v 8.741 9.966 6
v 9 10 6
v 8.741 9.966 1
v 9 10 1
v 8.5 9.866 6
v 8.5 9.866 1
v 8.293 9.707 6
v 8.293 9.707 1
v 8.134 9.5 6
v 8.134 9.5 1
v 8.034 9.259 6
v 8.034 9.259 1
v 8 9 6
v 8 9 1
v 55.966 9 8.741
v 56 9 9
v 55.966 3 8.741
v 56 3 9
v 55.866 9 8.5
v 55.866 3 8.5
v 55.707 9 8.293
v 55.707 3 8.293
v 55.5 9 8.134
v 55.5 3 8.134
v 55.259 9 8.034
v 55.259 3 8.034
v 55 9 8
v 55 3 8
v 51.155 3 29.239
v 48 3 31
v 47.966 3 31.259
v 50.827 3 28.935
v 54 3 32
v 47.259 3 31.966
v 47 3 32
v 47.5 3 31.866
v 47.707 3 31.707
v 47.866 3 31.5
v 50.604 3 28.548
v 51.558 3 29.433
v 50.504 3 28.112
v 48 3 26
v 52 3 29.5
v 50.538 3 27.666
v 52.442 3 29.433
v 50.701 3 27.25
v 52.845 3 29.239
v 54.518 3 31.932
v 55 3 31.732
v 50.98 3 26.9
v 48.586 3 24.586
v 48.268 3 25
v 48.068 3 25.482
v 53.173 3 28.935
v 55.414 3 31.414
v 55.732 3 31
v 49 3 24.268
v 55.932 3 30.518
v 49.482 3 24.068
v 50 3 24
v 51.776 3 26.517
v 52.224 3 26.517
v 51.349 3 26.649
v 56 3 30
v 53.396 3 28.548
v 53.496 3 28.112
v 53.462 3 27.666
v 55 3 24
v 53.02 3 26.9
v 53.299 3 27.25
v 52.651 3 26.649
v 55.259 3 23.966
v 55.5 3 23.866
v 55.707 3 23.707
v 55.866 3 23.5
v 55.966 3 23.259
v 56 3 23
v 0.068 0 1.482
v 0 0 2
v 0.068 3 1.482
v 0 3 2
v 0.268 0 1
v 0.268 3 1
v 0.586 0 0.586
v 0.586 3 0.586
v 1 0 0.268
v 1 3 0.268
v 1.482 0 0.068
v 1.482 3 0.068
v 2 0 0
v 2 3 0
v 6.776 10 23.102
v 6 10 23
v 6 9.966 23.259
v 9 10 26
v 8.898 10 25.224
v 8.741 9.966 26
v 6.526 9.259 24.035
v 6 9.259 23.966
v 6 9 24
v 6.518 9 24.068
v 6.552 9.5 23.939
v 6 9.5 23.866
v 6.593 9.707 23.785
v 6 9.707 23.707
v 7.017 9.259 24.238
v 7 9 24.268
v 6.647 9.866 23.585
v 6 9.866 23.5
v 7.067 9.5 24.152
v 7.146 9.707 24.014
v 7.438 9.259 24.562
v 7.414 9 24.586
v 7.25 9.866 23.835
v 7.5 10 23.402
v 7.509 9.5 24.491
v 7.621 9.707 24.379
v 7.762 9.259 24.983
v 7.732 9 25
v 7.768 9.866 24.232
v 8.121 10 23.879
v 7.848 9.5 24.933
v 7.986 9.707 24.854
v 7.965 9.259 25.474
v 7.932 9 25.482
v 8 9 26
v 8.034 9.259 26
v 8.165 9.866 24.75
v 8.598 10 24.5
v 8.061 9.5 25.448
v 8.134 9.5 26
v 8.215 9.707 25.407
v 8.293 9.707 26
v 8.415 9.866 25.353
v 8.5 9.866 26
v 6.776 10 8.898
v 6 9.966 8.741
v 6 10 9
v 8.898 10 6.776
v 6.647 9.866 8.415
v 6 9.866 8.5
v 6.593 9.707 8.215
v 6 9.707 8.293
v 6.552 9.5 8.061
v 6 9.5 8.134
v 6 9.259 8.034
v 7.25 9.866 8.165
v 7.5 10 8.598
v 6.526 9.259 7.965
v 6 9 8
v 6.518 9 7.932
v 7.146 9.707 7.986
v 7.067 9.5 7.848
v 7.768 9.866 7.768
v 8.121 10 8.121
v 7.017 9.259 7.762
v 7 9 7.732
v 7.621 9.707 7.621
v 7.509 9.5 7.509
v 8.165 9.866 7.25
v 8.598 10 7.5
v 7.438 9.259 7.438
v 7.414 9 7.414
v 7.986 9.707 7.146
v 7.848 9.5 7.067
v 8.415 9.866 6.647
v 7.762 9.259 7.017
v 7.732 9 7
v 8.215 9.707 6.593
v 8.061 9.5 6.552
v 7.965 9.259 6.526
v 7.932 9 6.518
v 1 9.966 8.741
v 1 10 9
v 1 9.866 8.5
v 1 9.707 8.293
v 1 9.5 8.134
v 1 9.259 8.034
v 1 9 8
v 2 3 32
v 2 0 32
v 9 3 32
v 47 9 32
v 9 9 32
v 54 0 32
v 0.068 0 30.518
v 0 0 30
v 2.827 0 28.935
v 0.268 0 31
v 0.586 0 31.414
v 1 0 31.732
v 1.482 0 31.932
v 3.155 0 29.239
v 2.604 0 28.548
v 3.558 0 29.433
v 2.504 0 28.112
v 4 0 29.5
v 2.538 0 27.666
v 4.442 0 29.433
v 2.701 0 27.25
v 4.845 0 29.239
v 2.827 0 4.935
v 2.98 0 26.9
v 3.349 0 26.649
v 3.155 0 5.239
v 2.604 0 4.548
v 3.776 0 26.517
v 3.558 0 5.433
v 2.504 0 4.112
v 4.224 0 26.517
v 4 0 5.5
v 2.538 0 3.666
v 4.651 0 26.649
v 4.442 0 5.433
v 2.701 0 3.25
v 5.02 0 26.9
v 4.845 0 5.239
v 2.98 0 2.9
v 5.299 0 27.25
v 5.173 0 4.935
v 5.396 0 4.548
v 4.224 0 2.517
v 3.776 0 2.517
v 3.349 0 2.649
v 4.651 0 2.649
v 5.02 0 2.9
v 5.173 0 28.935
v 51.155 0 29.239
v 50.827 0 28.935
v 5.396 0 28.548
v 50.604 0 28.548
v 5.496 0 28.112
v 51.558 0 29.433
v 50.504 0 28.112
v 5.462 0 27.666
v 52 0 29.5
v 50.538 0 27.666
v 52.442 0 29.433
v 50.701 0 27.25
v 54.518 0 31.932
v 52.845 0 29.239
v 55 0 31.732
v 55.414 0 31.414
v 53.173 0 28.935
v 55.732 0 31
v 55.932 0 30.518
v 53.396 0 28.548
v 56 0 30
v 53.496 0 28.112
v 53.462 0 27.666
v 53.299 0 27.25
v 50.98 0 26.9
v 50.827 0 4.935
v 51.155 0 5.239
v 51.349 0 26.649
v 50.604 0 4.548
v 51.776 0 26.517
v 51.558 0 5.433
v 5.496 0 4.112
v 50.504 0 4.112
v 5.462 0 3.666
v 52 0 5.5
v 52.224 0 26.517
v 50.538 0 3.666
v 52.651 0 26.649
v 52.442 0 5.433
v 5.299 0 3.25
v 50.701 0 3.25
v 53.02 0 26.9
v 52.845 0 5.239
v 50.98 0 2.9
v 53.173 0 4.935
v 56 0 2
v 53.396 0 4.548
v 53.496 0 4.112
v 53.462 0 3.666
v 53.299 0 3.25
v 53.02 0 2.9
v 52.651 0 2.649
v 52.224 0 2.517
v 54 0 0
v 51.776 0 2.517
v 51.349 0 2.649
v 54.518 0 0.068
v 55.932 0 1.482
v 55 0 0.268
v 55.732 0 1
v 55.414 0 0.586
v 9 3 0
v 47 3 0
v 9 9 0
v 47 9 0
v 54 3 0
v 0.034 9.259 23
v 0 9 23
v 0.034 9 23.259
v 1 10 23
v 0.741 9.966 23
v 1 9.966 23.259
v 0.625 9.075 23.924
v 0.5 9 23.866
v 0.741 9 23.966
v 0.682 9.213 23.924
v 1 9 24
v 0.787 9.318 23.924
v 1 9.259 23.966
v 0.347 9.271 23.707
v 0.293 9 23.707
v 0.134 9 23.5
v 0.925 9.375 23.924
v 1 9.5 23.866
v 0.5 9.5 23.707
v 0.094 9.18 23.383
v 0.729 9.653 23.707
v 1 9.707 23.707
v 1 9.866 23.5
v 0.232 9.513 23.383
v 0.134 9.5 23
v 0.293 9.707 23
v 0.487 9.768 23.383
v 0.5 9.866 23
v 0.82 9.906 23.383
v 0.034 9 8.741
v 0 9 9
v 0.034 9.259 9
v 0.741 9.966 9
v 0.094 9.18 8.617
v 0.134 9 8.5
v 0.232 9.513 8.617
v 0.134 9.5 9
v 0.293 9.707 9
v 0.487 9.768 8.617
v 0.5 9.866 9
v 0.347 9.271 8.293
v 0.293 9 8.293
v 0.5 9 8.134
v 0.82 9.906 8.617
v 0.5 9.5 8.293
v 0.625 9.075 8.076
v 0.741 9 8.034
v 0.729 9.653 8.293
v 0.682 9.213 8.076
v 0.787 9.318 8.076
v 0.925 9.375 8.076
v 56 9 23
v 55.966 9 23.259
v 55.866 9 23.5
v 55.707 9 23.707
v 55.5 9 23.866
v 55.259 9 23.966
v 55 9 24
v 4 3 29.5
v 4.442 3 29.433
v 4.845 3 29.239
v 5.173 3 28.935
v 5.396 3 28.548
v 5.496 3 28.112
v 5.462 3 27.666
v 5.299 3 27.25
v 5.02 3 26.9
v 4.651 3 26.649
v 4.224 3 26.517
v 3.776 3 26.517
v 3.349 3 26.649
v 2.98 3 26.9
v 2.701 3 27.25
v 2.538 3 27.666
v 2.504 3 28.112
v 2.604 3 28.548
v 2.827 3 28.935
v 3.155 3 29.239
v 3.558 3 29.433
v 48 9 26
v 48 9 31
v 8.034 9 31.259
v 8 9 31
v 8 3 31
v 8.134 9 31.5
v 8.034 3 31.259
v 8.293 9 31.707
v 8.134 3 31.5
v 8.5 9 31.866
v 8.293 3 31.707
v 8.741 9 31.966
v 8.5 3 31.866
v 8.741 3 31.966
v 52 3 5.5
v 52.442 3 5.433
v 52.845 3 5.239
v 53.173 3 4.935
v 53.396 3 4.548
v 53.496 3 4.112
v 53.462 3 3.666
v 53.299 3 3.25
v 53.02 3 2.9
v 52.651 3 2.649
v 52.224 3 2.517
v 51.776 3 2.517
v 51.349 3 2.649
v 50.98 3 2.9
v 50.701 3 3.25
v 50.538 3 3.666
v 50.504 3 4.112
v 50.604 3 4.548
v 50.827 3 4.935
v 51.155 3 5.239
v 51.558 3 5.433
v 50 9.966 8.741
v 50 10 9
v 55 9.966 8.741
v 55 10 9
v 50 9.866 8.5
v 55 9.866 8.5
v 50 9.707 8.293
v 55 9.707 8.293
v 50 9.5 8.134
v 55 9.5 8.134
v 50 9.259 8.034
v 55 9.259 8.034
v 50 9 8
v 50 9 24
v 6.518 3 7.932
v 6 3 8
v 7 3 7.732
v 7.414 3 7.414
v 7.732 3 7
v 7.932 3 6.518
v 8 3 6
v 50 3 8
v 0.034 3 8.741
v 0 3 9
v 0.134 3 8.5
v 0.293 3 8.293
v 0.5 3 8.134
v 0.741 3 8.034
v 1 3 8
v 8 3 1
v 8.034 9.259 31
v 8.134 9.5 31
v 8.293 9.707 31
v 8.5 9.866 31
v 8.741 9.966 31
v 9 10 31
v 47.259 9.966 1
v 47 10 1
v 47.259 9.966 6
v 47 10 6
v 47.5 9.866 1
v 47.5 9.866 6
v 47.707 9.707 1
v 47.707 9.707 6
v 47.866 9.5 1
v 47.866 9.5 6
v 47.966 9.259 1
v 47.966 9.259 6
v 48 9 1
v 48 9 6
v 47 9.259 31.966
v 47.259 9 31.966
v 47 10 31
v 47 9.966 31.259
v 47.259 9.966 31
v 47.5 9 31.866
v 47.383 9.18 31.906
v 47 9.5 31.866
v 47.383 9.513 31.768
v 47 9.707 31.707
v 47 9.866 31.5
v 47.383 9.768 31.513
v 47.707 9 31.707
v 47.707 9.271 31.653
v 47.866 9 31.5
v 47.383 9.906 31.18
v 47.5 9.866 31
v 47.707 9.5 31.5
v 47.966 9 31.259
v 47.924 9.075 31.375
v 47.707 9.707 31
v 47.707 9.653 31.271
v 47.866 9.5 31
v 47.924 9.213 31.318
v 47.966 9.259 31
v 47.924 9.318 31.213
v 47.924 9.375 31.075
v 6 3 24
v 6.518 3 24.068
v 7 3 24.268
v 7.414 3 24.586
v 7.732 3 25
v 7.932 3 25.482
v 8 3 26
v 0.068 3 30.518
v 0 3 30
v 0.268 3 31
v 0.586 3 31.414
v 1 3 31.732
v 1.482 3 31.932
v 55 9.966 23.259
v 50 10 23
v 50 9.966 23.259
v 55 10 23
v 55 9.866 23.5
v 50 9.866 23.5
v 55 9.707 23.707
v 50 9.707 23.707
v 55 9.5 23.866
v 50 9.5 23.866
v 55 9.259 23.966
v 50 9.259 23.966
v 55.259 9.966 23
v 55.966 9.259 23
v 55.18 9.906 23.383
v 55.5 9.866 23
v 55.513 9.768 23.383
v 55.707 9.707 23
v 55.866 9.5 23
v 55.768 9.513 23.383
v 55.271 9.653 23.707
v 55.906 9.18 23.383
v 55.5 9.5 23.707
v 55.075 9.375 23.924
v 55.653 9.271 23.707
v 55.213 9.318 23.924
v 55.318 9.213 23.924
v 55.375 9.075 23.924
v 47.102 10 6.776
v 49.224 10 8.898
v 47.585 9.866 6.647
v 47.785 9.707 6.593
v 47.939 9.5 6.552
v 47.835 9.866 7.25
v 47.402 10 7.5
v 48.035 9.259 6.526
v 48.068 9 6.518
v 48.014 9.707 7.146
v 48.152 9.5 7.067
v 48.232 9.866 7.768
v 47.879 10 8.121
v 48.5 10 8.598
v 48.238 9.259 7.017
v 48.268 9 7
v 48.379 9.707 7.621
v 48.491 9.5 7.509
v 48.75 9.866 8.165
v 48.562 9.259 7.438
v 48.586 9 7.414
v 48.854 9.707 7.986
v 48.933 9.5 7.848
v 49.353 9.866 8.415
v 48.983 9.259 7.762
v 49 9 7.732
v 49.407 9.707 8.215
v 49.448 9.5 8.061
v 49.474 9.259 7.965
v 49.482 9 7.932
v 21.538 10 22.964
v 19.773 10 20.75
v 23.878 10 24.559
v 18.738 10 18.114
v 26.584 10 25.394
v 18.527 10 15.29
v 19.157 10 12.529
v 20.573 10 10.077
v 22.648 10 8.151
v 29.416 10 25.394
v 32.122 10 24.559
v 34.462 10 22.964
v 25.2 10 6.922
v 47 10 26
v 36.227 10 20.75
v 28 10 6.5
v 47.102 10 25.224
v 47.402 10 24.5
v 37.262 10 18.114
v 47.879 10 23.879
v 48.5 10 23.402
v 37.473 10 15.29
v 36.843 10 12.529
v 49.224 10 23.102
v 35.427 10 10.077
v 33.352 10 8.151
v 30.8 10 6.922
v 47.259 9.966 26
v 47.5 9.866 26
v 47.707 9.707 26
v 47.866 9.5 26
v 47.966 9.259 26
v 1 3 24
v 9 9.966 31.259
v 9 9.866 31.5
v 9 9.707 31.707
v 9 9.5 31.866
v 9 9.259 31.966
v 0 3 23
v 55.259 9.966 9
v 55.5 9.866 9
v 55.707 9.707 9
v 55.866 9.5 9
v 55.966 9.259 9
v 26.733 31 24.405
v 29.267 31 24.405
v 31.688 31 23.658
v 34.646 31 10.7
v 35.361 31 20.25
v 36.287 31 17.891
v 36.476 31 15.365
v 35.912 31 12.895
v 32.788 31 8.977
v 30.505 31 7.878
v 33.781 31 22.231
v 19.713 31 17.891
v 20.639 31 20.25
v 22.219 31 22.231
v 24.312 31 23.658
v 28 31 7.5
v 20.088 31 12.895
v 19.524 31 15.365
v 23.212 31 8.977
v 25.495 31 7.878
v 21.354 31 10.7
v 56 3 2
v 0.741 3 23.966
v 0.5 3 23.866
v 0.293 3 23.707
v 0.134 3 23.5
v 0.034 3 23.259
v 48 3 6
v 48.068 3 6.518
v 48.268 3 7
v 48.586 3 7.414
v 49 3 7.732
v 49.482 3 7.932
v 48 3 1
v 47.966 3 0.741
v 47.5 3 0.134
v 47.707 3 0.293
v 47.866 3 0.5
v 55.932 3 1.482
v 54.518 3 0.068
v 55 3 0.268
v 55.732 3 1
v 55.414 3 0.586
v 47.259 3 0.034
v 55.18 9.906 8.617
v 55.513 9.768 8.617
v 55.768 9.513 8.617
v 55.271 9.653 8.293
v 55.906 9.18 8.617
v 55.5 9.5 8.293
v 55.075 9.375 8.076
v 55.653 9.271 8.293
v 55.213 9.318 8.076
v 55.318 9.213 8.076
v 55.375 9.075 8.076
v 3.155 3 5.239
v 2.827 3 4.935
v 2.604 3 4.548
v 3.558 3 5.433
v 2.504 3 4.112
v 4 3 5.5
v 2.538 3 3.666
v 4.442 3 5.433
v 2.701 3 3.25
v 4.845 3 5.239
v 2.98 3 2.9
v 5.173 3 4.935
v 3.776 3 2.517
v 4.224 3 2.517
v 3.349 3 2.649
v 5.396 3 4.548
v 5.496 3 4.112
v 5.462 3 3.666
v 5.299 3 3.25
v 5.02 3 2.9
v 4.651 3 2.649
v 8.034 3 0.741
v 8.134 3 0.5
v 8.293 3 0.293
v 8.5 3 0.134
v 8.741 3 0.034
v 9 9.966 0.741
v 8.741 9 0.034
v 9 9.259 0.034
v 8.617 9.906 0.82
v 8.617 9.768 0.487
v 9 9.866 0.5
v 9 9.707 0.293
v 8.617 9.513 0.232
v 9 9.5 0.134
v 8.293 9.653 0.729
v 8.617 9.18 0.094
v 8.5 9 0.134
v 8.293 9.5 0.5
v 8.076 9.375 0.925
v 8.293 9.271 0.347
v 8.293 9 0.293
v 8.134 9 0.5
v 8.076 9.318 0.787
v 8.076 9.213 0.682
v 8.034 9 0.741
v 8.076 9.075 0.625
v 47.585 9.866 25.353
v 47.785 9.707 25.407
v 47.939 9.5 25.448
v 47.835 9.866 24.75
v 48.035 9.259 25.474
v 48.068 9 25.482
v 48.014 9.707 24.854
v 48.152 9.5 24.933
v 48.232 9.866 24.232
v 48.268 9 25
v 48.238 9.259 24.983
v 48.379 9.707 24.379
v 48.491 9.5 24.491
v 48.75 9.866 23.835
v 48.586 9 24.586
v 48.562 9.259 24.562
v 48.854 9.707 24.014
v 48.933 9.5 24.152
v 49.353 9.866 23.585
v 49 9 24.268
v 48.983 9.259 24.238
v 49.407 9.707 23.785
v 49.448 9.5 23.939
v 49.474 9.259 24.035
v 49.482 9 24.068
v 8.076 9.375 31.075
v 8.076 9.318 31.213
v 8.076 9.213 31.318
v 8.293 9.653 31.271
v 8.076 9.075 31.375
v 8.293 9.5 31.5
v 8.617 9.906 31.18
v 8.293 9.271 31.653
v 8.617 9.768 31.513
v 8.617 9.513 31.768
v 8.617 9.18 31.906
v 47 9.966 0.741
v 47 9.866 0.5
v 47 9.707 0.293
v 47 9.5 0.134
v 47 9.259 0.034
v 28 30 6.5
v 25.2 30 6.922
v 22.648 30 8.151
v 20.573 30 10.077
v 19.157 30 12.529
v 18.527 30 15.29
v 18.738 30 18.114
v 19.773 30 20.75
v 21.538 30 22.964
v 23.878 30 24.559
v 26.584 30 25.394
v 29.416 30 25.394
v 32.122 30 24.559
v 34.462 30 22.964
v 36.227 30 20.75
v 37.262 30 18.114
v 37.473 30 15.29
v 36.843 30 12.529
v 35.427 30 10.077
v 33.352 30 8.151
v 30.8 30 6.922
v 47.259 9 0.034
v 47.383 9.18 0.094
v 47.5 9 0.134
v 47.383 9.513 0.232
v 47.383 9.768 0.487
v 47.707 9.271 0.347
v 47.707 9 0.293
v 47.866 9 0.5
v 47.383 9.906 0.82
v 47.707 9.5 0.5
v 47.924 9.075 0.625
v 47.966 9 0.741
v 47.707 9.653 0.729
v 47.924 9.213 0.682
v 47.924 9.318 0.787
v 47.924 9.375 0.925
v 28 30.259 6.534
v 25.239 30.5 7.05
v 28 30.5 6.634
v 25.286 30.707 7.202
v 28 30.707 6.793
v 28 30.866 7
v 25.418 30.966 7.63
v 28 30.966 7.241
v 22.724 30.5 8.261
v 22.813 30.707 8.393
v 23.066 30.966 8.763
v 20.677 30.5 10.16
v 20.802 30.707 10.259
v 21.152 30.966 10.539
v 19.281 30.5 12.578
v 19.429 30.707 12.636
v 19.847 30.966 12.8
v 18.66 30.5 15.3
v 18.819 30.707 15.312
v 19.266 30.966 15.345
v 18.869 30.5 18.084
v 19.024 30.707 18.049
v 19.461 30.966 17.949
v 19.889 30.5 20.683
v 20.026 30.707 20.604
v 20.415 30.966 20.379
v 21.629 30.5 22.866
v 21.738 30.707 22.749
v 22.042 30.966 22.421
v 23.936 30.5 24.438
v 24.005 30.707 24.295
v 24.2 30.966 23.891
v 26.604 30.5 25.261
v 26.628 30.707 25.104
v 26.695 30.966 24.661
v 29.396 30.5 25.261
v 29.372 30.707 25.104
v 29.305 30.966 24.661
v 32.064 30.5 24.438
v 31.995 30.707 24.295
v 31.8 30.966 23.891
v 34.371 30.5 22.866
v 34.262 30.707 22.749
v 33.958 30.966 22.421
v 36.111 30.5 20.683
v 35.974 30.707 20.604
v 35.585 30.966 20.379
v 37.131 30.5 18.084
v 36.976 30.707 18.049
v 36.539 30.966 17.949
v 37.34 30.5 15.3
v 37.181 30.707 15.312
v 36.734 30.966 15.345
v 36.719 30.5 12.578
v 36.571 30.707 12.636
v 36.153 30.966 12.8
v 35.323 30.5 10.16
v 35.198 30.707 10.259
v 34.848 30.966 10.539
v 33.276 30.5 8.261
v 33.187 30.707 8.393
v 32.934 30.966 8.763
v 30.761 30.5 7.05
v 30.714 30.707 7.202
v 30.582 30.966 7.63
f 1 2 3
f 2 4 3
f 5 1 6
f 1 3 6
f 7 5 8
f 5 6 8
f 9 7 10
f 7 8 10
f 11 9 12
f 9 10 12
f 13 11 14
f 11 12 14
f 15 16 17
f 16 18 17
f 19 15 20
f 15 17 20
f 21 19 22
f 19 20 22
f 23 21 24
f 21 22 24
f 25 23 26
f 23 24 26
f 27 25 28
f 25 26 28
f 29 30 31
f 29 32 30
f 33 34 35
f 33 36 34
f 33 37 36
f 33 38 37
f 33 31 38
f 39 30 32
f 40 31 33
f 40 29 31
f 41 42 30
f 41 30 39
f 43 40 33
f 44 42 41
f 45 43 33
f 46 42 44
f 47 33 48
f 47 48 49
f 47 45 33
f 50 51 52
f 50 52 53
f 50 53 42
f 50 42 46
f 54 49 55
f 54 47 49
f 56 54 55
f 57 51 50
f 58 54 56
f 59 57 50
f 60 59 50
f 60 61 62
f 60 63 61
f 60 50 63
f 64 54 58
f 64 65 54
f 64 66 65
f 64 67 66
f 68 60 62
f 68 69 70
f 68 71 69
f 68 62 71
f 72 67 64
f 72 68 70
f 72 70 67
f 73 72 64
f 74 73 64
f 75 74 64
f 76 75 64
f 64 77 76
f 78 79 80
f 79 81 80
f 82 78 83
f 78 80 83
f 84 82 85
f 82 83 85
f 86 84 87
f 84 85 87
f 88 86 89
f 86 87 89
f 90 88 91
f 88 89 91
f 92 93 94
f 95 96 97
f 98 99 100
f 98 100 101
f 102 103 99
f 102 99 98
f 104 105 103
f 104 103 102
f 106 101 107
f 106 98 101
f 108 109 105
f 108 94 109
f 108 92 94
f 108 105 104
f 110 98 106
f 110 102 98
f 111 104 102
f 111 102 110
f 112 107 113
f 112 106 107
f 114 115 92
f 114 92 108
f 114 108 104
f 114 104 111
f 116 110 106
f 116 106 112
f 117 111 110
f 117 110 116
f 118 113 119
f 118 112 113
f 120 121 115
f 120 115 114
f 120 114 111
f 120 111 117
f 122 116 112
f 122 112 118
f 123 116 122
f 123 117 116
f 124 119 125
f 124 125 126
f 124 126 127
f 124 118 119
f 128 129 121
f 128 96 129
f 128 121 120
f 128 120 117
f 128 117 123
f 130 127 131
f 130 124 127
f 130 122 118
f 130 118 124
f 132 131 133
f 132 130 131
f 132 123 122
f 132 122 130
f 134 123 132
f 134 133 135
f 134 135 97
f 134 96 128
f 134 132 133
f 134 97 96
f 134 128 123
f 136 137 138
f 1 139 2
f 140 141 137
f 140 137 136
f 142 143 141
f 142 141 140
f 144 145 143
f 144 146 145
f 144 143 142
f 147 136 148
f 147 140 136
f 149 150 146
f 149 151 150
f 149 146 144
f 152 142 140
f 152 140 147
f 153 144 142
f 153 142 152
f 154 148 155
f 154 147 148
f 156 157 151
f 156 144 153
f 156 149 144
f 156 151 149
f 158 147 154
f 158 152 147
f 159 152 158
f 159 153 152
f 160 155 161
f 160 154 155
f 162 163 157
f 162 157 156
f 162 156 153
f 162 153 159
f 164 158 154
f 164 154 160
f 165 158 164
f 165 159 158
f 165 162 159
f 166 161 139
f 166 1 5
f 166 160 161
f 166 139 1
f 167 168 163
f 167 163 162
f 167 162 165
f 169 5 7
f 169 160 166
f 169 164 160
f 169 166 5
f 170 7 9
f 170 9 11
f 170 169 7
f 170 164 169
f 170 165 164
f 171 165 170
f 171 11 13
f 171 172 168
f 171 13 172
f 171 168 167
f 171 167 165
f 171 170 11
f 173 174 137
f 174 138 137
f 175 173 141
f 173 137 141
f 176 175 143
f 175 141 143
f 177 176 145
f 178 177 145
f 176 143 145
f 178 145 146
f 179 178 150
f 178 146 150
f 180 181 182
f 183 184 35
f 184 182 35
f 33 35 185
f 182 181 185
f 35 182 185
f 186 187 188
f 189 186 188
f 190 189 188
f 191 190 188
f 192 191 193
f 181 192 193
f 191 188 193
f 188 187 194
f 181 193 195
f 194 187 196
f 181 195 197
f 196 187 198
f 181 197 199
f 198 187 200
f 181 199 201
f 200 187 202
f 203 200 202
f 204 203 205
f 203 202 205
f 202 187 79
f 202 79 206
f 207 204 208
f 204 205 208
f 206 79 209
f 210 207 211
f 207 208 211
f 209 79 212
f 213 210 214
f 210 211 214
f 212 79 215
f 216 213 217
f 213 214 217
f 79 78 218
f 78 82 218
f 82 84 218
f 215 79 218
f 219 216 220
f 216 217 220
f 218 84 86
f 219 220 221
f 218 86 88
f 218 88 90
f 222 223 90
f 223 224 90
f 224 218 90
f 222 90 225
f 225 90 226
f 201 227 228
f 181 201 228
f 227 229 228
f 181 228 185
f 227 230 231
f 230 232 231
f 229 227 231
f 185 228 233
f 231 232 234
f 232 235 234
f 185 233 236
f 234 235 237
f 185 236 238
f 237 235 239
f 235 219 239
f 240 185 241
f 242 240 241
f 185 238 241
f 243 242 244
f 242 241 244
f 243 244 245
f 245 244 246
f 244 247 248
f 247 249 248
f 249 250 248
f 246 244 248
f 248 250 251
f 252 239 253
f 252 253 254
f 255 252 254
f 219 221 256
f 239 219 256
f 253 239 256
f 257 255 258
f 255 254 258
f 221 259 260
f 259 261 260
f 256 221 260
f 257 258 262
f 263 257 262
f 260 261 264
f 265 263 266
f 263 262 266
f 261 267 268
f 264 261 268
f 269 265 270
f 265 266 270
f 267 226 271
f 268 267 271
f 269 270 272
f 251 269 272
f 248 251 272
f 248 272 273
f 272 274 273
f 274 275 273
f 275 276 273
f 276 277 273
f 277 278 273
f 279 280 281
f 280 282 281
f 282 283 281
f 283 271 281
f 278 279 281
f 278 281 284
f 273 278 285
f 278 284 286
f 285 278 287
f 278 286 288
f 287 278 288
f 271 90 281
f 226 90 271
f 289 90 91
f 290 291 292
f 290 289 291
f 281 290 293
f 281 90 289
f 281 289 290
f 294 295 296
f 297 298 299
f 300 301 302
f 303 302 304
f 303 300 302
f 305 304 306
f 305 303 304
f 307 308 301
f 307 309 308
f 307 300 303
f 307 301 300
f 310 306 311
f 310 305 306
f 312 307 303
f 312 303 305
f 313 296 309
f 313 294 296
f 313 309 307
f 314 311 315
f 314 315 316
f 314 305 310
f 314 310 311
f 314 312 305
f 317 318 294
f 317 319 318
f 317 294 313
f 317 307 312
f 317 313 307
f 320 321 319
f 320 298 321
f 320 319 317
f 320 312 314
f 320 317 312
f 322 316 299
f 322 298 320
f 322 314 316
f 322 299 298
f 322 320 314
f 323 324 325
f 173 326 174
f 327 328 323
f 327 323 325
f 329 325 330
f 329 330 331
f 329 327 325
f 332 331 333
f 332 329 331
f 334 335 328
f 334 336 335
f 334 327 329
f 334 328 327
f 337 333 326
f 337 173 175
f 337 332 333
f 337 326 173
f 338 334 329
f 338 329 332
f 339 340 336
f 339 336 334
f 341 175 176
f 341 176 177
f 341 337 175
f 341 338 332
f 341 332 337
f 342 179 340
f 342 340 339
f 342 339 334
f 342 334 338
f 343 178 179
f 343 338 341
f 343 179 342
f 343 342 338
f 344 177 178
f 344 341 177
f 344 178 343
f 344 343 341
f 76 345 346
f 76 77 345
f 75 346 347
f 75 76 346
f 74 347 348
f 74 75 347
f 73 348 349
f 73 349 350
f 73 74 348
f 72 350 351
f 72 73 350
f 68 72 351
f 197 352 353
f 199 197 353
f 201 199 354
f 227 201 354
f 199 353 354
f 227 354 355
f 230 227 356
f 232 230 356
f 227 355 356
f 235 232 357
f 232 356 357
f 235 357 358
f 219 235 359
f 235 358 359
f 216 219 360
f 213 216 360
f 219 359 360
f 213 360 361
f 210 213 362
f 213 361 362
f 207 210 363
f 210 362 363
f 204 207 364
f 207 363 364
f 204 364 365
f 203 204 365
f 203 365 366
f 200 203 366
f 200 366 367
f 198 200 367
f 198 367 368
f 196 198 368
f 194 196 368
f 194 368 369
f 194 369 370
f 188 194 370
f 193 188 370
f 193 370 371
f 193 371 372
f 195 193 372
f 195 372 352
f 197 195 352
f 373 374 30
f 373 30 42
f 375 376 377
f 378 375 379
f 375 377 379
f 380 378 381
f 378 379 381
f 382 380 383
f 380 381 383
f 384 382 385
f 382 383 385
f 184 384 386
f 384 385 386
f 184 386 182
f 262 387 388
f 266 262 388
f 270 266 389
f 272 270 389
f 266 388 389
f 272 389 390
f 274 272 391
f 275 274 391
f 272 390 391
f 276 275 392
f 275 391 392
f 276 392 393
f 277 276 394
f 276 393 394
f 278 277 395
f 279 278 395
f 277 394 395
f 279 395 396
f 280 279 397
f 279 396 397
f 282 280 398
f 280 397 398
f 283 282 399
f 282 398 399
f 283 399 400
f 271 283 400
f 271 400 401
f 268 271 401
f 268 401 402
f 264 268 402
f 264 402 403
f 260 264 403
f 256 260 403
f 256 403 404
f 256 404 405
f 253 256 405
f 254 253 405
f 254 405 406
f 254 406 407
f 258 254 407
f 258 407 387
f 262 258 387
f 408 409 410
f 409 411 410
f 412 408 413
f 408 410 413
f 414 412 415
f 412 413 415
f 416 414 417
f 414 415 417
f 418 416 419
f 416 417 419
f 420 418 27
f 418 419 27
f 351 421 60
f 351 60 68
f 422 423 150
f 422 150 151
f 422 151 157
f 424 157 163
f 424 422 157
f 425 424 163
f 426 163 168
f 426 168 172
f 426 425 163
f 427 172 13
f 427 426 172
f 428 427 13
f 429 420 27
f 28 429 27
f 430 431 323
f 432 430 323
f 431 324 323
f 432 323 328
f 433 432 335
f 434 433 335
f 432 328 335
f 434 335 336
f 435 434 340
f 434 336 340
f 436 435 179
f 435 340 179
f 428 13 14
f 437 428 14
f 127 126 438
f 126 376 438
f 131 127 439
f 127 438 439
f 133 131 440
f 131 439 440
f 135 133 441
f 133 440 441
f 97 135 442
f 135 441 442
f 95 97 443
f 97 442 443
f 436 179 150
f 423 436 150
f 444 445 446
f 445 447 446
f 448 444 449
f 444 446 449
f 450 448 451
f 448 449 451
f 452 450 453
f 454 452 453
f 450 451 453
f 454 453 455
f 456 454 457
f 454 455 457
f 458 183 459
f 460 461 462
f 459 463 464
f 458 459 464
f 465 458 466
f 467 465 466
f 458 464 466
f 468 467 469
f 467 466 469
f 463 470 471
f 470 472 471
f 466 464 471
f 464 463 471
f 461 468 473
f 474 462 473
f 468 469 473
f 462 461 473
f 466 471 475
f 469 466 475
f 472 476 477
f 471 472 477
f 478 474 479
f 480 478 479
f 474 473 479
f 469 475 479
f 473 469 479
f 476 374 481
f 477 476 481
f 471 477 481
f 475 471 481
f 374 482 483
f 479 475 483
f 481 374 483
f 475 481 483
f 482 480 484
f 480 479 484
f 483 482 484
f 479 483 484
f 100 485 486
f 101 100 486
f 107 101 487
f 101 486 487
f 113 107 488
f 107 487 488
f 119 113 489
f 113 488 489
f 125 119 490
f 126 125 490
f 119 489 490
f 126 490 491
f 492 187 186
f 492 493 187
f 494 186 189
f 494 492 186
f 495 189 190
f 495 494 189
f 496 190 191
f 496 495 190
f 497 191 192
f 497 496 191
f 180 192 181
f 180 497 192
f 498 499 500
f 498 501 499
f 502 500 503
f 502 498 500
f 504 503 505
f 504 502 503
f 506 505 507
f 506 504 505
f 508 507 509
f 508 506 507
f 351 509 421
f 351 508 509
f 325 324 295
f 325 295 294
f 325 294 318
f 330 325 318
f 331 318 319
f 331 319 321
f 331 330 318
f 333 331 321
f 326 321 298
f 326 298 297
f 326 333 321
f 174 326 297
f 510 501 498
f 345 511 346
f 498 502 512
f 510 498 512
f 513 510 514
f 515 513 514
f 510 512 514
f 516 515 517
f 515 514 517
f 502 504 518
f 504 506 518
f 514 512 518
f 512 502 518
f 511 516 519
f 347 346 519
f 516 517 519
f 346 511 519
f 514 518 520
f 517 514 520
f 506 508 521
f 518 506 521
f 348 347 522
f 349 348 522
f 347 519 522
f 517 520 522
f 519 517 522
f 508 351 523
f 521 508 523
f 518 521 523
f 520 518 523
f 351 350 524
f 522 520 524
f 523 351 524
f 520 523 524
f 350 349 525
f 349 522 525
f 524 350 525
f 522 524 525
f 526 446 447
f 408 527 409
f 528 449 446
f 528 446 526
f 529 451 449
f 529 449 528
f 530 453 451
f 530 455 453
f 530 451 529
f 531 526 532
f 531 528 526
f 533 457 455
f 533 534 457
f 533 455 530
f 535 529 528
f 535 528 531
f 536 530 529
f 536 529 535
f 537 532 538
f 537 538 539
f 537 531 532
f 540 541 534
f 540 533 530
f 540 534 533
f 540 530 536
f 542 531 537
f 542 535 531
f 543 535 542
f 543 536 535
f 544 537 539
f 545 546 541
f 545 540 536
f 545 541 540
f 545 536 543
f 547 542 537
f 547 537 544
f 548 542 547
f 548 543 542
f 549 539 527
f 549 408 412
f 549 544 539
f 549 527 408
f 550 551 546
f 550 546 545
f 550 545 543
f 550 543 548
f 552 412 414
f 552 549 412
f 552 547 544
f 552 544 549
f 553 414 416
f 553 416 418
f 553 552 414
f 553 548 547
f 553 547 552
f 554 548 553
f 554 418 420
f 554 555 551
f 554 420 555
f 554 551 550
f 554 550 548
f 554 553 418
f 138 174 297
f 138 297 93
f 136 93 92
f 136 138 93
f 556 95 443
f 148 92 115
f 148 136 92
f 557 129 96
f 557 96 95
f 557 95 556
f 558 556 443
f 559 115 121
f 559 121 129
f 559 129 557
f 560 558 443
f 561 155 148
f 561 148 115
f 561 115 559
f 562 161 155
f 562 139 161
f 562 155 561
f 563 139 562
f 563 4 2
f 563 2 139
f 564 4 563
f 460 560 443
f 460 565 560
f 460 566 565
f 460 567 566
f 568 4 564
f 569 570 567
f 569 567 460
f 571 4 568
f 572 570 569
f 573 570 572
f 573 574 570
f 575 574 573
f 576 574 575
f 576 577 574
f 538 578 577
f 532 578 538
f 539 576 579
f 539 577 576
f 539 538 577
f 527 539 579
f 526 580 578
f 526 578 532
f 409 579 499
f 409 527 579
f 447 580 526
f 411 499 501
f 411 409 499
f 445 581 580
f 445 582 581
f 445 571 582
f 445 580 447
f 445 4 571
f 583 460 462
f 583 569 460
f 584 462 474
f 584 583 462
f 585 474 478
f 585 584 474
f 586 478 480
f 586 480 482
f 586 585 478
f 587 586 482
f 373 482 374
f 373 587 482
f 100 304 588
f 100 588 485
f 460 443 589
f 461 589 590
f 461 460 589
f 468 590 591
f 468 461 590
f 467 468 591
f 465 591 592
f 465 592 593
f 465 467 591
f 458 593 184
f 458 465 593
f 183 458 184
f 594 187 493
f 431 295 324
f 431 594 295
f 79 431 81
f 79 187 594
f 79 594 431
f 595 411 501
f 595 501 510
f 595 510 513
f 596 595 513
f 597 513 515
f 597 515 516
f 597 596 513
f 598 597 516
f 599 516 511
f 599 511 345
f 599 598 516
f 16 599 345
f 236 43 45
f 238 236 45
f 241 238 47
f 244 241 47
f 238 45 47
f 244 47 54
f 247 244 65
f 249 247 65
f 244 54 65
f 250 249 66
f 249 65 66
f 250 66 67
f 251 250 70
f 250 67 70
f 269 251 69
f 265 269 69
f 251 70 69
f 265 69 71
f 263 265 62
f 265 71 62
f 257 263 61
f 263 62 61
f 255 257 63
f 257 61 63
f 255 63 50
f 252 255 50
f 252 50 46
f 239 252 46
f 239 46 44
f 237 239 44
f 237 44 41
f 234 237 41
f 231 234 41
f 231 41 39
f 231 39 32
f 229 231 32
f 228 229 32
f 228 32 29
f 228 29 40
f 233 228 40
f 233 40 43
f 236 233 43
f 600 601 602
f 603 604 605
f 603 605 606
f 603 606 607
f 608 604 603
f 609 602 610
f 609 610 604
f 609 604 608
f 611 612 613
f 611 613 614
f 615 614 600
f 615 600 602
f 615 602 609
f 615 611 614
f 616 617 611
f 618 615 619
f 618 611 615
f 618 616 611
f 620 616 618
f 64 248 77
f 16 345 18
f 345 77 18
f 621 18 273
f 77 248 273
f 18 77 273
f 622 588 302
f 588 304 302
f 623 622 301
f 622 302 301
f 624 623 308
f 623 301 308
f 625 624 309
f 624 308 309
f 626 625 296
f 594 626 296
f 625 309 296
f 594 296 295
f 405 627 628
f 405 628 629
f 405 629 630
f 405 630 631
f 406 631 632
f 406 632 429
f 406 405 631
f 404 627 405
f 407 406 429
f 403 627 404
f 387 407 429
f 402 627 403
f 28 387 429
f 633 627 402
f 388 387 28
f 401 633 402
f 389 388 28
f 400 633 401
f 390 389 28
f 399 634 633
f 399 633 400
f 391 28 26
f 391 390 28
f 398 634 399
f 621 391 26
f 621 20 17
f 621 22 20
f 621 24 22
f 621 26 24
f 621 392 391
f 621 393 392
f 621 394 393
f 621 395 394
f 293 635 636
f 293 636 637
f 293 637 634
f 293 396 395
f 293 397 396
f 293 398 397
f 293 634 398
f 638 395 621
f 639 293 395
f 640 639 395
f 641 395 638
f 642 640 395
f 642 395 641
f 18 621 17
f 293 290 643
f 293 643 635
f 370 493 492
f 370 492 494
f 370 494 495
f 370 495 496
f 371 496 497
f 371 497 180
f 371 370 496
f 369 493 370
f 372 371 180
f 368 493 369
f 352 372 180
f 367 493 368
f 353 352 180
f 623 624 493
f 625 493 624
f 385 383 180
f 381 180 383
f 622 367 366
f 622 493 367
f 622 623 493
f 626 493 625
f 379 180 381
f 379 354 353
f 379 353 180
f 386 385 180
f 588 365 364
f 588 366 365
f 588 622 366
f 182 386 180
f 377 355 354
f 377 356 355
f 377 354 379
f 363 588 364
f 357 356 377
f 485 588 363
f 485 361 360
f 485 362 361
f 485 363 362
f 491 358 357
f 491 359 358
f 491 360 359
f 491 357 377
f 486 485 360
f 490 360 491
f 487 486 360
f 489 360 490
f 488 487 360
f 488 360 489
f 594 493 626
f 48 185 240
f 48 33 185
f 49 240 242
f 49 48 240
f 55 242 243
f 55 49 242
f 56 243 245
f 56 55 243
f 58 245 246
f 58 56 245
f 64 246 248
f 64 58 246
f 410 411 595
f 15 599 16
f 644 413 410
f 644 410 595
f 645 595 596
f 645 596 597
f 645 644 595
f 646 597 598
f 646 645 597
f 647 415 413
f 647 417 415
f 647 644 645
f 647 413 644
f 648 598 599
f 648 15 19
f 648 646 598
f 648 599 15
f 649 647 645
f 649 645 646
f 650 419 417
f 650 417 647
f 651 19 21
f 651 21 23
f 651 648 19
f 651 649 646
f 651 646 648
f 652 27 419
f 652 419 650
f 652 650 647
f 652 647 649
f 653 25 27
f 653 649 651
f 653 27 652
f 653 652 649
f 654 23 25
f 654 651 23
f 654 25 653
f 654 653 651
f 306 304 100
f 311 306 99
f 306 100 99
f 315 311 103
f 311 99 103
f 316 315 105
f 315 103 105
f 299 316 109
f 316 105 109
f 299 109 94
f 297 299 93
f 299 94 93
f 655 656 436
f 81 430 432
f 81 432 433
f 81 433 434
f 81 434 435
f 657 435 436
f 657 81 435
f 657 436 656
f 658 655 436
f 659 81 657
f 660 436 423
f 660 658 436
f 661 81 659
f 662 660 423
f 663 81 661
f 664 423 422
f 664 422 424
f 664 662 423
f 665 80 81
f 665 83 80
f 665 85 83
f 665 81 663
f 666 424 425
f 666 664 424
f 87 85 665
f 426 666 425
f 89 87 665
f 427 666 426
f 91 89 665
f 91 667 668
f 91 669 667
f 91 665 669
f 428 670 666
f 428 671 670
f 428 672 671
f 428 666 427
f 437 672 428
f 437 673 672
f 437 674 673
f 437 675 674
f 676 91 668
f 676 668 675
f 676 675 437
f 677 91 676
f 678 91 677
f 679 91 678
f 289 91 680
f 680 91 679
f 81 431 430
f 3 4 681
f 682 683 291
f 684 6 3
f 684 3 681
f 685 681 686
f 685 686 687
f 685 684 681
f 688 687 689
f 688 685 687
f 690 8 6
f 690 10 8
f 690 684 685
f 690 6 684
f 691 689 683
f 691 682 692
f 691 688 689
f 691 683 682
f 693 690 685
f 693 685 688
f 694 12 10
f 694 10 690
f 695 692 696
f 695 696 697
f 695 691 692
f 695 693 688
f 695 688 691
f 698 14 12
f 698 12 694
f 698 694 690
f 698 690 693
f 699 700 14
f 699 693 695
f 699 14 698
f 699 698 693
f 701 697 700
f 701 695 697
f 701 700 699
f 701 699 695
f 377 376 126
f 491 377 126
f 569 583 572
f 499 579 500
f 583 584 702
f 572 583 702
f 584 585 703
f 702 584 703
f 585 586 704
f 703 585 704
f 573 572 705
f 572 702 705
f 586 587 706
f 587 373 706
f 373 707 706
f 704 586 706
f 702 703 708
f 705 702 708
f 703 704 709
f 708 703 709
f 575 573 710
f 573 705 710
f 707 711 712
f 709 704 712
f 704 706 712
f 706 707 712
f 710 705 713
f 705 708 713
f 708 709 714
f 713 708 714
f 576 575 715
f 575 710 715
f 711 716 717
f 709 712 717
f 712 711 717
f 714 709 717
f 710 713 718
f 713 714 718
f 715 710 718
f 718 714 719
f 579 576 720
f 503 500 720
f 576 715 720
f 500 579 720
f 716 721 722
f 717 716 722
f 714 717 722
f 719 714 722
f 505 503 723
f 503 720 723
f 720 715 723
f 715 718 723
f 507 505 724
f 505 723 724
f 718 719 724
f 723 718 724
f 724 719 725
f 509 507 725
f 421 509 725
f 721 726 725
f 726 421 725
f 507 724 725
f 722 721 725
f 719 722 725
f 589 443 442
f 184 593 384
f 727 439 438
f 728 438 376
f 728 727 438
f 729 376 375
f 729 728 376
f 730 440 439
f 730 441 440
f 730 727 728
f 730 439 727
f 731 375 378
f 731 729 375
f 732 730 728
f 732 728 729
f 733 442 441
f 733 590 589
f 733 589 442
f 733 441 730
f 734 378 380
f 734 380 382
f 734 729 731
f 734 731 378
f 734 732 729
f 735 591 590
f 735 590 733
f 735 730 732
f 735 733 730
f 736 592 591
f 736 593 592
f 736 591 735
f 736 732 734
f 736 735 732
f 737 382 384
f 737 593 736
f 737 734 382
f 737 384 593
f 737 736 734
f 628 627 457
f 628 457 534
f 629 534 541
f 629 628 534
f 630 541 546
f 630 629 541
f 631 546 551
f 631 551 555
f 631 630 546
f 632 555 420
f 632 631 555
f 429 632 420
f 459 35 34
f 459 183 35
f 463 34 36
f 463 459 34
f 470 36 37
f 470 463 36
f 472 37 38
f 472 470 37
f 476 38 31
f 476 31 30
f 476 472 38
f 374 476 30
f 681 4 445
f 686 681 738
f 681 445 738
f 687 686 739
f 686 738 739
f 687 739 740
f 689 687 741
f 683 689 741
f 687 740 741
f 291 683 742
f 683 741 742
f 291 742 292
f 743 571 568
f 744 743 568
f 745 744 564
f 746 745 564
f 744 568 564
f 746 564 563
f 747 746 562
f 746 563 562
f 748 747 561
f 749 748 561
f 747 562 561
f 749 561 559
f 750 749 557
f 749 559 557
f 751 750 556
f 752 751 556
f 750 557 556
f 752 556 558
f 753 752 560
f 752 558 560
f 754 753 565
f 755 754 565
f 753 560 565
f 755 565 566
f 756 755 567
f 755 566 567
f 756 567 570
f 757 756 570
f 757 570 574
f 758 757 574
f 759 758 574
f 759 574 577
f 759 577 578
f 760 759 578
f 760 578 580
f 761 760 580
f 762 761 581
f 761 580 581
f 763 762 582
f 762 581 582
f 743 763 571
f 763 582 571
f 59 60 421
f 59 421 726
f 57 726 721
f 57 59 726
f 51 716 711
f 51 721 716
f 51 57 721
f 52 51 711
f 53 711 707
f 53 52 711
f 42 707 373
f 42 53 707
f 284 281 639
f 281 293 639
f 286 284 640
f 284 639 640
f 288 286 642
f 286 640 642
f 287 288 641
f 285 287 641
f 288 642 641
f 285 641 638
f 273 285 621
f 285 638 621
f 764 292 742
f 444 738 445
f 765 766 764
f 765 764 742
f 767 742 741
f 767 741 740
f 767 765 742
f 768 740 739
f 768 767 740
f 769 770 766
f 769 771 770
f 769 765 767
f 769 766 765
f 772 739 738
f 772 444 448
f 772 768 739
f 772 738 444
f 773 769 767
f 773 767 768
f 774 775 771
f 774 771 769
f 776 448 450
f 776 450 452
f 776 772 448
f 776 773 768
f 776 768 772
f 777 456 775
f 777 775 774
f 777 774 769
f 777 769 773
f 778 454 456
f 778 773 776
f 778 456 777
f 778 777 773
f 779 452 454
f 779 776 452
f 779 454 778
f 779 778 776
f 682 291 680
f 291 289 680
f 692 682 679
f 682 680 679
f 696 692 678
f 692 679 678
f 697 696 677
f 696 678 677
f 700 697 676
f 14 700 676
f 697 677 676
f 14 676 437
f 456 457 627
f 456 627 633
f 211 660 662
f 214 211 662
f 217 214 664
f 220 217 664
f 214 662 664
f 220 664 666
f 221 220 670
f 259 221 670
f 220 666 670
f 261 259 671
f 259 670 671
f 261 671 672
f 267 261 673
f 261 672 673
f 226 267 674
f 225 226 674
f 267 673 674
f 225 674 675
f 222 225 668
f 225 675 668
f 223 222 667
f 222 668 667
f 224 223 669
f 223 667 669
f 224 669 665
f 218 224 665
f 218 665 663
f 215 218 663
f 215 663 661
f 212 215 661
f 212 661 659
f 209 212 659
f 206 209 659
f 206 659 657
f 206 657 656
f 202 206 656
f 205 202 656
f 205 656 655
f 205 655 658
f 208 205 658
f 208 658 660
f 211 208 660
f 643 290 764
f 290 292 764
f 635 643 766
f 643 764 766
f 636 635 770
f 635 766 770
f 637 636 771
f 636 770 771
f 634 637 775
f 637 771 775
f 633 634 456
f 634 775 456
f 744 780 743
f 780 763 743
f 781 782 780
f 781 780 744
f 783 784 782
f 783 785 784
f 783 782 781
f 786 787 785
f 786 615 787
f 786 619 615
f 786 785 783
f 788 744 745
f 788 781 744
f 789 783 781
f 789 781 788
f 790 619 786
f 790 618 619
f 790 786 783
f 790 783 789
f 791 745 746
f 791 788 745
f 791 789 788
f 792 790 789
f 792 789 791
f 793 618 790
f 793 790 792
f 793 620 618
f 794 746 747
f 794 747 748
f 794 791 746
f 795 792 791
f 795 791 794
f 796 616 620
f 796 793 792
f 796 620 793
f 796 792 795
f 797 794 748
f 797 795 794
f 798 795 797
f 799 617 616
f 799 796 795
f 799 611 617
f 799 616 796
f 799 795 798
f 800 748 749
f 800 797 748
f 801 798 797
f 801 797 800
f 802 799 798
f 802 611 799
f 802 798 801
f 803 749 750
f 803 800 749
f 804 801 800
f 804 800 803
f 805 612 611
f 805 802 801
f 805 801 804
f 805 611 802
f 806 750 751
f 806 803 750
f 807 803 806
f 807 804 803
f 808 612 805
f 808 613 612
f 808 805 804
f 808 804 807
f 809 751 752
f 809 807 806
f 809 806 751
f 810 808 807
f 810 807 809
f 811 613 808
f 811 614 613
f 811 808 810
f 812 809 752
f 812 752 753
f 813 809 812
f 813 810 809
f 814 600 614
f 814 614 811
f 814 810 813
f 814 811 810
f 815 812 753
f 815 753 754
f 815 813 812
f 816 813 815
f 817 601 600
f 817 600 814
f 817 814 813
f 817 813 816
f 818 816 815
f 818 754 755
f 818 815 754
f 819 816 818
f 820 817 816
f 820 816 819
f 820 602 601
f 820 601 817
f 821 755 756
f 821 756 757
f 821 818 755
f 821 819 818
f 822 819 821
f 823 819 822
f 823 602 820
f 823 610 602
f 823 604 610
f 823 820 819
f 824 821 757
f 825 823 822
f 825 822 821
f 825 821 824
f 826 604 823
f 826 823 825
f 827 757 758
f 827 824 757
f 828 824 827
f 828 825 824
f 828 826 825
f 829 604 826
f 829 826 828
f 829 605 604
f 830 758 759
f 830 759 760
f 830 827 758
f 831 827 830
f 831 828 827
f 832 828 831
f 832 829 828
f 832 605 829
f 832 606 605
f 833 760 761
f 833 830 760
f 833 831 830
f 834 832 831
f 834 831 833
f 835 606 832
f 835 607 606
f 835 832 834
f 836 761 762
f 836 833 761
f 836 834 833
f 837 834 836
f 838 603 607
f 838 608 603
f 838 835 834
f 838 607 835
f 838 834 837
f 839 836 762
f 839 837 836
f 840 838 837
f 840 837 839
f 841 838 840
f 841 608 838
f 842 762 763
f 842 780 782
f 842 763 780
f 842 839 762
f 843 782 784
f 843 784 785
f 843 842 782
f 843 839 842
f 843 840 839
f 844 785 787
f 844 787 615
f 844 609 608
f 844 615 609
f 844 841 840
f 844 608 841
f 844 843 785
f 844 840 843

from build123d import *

# Parameters (mm, degrees)
CROQUIS1_W              = 56
CROQUIS1_H              = 32
SALIENTE_EXTRUIR1_DEPTH = 10
CROQUIS2_R              = 9.5
SALIENTE_EXTRUIR2_DEPTH = 21
CROQUIS3_W              = 8
CROQUIS3_H              = 8
CORTAR_EXTRUIR1_DEPTH   = 7
CROQUIS4_R              = 1.5
CORTAR_EXTRUIR2_DEPTH   = 71.313583325
REDONDEO1_R             = 2
REDONDEO2_R             = 1
REDONDEO3_R             = 1
REDONDEO4_R             = 1


with BuildPart() as part:
    # Croquis1 → Saliente-Extruir1 (new body)
    with BuildSketch(Plane(origin=(0, 0, 0), x_dir=(1, 0, 0), z_dir=(0, 1, 0))):
        with Locations((28, -16)):
            Rectangle(CROQUIS1_W, CROQUIS1_H)
    extrude(amount=SALIENTE_EXTRUIR1_DEPTH)

    # Croquis2 → Saliente-Extruir2 (add)
    with BuildSketch(Plane(origin=(0, 10, 0), x_dir=(1, 0, 0), z_dir=(0, 1, 0))):
        with Locations(Location((28, -16, 0), (0, 0, 90))):
            Circle(CROQUIS2_R)
    extrude(amount=SALIENTE_EXTRUIR2_DEPTH)

    # Croquis3 → Cortar-Extruir1 (cut)
    with BuildSketch(Plane(origin=(0, 10, 0), x_dir=(1, 0, 0), z_dir=(0, 1, 0))):
        with Locations((52, -28)):
            Rectangle(CROQUIS3_W, CROQUIS3_H)
        with Locations((52, -4)):
            Rectangle(CROQUIS3_W, CROQUIS3_H)
        with Locations((4, -4)):
            Rectangle(CROQUIS3_W, CROQUIS3_H)
        with Locations((4, -28)):
            Rectangle(CROQUIS3_W, CROQUIS3_H)
    extrude(amount=-CORTAR_EXTRUIR1_DEPTH, mode=Mode.SUBTRACT)

    # Croquis4 → Cortar-Extruir2 (cut, through all)
    with BuildSketch(Plane(origin=(0, 3, 0), x_dir=(1, 0, 0), z_dir=(0, 1, 0))):
        with Locations(Location((4, -4, 0), (0, 0, 270))):
            Circle(CROQUIS4_R)
        with Locations(Location((4, -28, 0), (0, 0, 270))):
            Circle(CROQUIS4_R)
        with Locations(Location((52, -28, 0), (0, 0, 270))):
            Circle(CROQUIS4_R)
        with Locations(Location((52, -4, 0), (0, 0, 270))):
            Circle(CROQUIS4_R)
    extrude(amount=-CORTAR_EXTRUIR2_DEPTH, mode=Mode.SUBTRACT)

    # Redondeo1
    redondeo1_edges = [part.edges().sort_by_distance(p)[0] for p in [
        (0, 1.5, 0),
        (56, 1.5, 0),
        (56, 1.5, 32),
        (0, 1.5, 32),
        (8, 6.5, 24),
        (8, 6.5, 8),
        (48, 6.5, 8),
        (48, 6.5, 24),
    ]]
    fillet(redondeo1_edges, radius=REDONDEO1_R)

    # Redondeo2
    redondeo2_edges = [part.edges().sort_by_distance(p)[0] for p in [
        (0, 10, 16),
        (28, 10, 32),
        (56, 10, 16),
        (28, 10, 0),
    ]]
    fillet(redondeo2_edges, radius=REDONDEO2_R)

    # Redondeo3
    redondeo3_edges = [part.edges().sort_by_distance(p)[0] for p in [
        (48, 10, 28.5),
        (8, 10, 3.5),
        (3.5, 10, 24),
        (48.585786438, 10, 7.414213562),
        (48.585786438, 10, 24.585786438),
        (7.414213562, 10, 7.414213562),
        (7.414213562, 10, 24.585786438),
        (8, 10, 28.5),
        (52.5, 10, 24),
        (48, 10, 3.5),
        (3.5, 10, 8),
        (0.292893219, 9.707106781, 24),
        (0.292893219, 9.707106781, 8),
        (8, 9.707106781, 0.292893219),
        (48, 9.707106781, 0.292893219),
        (55.707106781, 9.707106781, 8),
        (55.707106781, 9.707106781, 24),
        (48, 9.707106781, 31.707106781),
        (8, 9.707106781, 31.707106781),
        (8, 6, 32),
        (0, 6, 24),
        (0, 6, 8),
        (8, 6, 0),
        (48, 6, 0),
        (56, 6, 8),
        (48, 6, 32),
        (56, 6, 24),
        (52.5, 10, 8),
    ]]
    fillet(redondeo3_edges, radius=REDONDEO3_R)

    # Redondeo4
    redondeo4_edges = [part.edges().sort_by_distance(p)[0] for p in [
        (28, 31, 25.5),
    ]]
    fillet(redondeo4_edges, radius=REDONDEO4_R)


solid = part.part
